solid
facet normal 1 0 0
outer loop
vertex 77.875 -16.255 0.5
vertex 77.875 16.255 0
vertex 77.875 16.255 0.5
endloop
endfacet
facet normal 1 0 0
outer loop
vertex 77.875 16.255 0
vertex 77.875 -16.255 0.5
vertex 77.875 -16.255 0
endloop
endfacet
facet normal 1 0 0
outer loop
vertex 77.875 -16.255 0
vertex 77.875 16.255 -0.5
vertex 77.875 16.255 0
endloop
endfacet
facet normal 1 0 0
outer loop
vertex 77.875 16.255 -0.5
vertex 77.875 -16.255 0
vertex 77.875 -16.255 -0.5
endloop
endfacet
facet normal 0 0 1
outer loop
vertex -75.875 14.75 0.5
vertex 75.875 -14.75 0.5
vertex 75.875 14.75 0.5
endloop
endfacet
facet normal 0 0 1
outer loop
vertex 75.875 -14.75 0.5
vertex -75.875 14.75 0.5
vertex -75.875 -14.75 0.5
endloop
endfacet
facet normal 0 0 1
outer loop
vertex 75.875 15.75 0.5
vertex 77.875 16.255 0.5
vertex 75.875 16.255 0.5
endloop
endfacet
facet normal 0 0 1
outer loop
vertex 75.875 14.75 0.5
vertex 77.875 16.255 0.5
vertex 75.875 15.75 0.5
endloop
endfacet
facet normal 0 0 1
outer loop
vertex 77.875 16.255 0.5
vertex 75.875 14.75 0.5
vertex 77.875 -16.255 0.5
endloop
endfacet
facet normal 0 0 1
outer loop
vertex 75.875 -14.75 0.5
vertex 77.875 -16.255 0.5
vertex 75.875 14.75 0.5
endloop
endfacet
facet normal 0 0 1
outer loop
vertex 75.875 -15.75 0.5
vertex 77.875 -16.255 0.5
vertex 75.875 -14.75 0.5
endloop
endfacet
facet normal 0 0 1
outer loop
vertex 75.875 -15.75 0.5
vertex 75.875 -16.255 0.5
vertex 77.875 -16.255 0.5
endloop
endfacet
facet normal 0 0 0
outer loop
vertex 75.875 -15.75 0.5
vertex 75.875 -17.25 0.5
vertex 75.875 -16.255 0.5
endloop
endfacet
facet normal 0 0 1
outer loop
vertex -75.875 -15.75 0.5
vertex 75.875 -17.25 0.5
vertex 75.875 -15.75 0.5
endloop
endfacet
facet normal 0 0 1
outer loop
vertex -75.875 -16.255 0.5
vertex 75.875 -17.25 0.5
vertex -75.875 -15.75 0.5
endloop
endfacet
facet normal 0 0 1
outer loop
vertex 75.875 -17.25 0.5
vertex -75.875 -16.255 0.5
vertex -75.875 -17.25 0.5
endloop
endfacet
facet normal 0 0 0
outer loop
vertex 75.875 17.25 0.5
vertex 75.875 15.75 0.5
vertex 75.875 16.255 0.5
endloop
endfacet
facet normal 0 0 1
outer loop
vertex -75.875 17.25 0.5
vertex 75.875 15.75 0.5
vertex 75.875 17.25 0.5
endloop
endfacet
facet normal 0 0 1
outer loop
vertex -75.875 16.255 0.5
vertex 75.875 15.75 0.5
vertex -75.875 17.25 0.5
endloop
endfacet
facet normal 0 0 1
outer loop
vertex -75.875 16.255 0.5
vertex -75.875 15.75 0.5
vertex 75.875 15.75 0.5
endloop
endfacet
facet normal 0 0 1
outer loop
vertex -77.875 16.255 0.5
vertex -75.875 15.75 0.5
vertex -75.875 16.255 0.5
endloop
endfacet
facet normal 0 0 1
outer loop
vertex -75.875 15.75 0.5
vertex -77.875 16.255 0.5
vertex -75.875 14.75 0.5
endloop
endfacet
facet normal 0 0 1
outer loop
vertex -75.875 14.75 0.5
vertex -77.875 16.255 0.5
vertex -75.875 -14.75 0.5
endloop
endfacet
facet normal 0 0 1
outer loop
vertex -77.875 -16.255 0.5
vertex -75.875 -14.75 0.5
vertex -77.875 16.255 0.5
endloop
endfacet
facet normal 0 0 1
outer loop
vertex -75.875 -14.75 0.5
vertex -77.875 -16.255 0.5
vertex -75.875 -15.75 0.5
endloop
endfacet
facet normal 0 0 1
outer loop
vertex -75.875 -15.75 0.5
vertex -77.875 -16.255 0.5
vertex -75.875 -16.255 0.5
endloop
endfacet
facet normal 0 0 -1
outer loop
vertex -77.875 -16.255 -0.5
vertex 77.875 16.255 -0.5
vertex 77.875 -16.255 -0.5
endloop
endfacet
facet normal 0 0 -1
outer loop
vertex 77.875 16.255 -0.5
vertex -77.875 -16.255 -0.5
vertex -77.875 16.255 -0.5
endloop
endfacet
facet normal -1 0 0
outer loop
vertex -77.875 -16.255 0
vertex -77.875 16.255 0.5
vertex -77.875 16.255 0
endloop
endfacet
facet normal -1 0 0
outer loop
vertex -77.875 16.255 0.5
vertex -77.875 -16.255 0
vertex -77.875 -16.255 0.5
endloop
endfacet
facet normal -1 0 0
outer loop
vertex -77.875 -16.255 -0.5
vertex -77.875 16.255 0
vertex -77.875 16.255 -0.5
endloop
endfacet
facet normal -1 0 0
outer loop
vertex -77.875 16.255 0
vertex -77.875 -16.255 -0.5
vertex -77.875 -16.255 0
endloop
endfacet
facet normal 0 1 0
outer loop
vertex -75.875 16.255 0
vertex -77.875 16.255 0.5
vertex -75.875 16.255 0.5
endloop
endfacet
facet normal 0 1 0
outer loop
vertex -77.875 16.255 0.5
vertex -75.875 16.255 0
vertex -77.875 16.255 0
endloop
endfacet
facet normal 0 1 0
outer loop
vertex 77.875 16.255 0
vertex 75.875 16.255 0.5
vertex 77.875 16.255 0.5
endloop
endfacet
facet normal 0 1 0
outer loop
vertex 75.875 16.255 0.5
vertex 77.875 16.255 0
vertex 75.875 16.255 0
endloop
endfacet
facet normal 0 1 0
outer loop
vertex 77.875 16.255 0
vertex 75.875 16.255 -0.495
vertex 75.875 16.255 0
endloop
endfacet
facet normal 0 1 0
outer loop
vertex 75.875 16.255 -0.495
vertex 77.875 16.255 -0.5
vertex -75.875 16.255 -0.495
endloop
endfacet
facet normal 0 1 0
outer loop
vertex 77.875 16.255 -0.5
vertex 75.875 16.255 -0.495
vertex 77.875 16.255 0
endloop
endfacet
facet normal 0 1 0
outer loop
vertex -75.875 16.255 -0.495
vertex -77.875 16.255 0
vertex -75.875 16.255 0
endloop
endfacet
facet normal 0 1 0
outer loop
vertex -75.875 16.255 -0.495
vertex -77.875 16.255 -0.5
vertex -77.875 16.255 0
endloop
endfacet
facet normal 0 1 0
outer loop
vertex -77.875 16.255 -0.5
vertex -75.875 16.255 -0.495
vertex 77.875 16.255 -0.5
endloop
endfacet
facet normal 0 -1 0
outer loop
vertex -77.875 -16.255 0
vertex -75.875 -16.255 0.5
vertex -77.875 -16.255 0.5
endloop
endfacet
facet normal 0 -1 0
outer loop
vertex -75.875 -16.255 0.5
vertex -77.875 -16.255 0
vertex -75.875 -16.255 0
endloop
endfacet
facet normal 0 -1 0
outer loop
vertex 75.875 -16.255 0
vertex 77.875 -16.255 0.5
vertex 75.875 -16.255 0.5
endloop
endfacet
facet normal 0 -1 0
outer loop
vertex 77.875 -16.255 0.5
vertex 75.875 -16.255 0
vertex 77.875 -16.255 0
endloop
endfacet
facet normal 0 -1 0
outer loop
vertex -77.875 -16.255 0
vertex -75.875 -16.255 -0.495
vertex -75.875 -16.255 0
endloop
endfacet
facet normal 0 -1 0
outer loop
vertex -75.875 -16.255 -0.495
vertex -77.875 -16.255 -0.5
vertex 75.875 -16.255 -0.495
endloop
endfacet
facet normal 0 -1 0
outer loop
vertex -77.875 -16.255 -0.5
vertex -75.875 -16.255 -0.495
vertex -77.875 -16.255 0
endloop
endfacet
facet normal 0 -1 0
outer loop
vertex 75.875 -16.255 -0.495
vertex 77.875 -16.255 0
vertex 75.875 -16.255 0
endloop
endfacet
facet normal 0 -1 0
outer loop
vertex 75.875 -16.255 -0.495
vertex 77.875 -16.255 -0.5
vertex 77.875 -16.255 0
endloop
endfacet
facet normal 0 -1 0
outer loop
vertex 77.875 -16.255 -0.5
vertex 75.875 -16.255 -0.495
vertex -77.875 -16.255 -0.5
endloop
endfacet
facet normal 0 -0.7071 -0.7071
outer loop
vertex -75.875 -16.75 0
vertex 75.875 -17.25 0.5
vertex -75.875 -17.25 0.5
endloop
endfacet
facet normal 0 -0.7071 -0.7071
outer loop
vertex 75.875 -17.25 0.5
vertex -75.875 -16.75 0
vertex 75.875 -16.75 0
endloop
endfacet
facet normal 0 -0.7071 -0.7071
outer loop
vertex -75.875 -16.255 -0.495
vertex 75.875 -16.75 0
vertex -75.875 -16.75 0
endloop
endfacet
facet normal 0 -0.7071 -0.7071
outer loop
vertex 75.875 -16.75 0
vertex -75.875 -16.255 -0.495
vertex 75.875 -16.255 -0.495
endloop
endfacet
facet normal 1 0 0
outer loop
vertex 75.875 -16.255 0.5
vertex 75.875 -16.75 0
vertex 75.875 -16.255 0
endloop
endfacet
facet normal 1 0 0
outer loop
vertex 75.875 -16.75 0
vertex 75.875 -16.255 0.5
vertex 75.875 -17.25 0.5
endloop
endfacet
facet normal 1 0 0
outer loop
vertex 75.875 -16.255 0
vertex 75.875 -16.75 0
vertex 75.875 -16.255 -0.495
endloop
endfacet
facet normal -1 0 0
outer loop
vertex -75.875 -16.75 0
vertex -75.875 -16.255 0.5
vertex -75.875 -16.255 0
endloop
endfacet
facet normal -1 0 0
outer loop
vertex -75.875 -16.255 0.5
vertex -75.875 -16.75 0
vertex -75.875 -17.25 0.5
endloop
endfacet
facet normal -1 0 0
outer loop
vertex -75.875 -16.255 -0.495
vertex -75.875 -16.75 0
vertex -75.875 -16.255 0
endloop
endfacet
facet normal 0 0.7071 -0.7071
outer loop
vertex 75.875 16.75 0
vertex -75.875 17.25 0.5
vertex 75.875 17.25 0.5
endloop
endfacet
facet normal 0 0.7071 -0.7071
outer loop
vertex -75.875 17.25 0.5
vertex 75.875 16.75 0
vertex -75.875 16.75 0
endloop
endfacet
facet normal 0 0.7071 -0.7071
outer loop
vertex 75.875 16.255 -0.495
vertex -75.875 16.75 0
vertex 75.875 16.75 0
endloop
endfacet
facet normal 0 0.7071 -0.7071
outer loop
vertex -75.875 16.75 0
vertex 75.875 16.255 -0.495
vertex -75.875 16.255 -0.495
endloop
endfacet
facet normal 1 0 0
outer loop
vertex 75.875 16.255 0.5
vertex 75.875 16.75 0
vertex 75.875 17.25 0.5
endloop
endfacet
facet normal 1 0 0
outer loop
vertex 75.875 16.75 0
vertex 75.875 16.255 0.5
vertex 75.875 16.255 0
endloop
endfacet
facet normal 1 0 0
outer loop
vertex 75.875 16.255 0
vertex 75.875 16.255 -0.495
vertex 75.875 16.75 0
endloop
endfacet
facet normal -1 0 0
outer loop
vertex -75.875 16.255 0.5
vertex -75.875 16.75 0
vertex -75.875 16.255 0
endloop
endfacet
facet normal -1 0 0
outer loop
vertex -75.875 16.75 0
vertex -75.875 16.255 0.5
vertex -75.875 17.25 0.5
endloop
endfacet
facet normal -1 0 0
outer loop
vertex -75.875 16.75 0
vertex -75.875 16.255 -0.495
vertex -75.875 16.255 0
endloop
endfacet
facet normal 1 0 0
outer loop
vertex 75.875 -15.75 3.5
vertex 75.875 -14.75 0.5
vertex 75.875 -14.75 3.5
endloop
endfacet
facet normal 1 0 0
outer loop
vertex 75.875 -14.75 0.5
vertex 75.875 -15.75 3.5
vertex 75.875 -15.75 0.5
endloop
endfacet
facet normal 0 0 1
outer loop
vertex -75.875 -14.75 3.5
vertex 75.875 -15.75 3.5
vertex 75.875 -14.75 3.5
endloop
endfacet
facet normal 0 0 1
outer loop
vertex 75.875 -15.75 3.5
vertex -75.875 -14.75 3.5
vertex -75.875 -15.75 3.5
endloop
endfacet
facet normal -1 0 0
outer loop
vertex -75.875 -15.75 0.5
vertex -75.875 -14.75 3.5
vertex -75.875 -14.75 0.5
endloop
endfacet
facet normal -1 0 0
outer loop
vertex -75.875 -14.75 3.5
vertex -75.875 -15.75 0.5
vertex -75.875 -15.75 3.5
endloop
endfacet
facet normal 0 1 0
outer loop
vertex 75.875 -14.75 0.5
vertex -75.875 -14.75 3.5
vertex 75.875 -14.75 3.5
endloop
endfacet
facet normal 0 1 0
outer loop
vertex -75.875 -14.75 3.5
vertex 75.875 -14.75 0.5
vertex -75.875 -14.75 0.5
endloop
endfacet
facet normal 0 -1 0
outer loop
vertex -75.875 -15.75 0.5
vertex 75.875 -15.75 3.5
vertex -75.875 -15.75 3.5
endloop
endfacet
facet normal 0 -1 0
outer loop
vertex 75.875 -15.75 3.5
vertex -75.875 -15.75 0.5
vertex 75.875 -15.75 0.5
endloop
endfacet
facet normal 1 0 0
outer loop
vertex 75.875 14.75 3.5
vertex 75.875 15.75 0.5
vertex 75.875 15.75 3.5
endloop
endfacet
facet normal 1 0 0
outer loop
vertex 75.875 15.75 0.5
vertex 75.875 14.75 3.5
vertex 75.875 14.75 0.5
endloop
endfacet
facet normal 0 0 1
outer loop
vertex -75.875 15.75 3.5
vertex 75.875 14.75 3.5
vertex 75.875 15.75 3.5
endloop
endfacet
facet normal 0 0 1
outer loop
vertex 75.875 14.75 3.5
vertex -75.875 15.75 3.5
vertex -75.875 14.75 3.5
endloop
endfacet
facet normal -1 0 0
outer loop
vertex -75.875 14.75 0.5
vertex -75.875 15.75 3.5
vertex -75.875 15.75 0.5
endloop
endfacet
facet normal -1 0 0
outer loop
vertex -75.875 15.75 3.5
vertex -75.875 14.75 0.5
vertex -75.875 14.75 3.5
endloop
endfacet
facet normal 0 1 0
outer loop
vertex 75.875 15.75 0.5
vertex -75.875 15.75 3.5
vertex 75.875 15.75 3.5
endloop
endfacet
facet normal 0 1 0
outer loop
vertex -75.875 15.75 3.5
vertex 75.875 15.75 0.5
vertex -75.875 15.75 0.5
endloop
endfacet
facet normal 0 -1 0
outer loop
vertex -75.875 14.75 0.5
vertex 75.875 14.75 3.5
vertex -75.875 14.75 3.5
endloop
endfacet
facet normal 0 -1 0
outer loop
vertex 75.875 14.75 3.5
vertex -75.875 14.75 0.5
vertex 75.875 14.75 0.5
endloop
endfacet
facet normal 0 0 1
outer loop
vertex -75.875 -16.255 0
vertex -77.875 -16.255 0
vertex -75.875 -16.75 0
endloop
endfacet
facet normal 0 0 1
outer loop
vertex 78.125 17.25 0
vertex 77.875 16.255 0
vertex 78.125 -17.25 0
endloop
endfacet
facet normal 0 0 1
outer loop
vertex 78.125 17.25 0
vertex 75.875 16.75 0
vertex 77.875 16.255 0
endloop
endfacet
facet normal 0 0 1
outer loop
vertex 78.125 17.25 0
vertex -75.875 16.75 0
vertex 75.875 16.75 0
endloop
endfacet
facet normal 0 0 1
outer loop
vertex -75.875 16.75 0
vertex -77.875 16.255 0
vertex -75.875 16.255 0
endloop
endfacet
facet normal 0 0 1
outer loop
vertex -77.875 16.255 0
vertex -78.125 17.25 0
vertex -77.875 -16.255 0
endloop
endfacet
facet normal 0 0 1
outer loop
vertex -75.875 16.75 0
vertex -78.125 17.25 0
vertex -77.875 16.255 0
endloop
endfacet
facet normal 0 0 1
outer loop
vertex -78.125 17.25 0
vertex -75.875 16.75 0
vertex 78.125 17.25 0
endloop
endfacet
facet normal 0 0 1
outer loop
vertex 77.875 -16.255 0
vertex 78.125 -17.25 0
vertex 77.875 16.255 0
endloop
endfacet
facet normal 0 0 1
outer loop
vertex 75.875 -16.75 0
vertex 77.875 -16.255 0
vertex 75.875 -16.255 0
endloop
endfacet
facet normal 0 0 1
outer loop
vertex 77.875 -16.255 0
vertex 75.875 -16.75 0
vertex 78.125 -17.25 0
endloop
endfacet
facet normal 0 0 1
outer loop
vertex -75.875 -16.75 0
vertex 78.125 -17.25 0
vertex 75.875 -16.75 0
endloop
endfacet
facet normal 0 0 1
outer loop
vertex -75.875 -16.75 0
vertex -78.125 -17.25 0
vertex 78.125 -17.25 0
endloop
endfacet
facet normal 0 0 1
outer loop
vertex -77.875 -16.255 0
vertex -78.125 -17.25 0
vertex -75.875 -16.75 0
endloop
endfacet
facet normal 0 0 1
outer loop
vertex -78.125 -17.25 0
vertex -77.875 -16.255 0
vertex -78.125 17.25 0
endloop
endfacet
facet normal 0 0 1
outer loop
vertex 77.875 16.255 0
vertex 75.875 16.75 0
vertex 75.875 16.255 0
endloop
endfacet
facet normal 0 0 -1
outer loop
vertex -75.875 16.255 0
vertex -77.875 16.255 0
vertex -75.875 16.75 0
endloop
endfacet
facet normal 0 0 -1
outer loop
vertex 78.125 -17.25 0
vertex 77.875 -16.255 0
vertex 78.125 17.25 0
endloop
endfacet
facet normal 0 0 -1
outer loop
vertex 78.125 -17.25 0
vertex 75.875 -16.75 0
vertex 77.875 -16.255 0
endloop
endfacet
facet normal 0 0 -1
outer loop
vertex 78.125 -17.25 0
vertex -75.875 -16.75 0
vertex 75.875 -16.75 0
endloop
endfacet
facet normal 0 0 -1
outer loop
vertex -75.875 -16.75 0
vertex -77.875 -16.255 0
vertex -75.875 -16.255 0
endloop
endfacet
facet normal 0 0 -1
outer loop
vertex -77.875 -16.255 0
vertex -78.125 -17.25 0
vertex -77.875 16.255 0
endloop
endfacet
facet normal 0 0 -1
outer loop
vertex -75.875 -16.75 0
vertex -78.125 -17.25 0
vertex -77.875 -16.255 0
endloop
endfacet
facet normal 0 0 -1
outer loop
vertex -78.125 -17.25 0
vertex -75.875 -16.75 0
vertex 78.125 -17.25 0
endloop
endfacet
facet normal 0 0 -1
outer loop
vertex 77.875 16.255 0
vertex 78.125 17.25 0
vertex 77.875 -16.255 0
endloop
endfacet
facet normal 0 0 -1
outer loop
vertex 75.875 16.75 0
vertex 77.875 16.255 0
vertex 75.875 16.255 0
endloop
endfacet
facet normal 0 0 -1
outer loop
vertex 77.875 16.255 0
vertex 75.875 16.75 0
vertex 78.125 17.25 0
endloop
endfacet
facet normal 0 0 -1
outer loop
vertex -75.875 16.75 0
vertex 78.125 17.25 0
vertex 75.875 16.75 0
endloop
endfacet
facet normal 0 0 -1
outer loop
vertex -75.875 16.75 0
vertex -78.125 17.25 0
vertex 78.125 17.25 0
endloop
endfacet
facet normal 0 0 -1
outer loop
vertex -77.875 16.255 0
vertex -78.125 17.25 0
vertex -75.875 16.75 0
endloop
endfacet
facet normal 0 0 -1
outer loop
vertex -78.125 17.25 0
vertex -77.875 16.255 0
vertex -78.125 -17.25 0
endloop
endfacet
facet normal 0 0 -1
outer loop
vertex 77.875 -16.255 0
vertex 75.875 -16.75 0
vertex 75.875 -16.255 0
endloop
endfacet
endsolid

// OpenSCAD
// file: mod_prism.scad
/// @file mod_prism.scad
///
/// @author © Dave Harris 2022
///

// points   1        ^
//        / | \      |
//       /  4  \     h
//      /  / \  \    |
//     0--/---\--2   v
//   w | /     \ | 
//     3---------5
//     <lLH><lRH>


module prism(h=20, lLH=15, lRH=25, w=1)
{
 polyhedron(
  points=[
   [0, 0, 0]       // 0 back LH corner
  ,[lLH, h, 0]     // 1 back peak
  ,[lLH+lRH, 0, 0] // 2 back RH corner
  ,[0, 0, w]       // 3 front LH corner
  ,[lLH, h, w]     // 4 front peak
  ,[lLH+lRH, 0, w] // 5 front RH corner
  ]
  , faces=[
    [0, 3, 5, 2] // bottom
   ,[0, 1, 4, 3] // LH ramp
   ,[1, 2, 5, 4] // RH ramp 
   ,[2, 1, 0]    // back wall
   ,[3, 4, 5]    // front wall
   ]
 );
} // end of module prism()

// local test prism
prism(lLH=1, lRH= 22, h=18, w=1 );

// eof
// file: fb_globals.scad
/// @file fb_globals.scad
///
/// @brief project footbridge globals
///
/// @author © Dave Harris 2022
///
/// Included in all project files.


$fa = 1;   // Fragment angle
$fs = 0.4; // Fragment size resolution

// global constants
//------------------

H_canopy = 47;

H_bridge = 49.5; // platform<>bridge
W_bridge = 36;   // width of bridge
                 // > walkway
W_walk   = 34.5; // width
H_walk   = 36;   // height of walkway


Steps    = 27;   // number of steps
W_stairs = 32;   // width ~ 9'6" @ H0
L_tread  = 3.5;  // tread ~ 12" @ H0
L_stairs = L_tread * (Steps +1);
H_rise   = H_bridge / (Steps +1); 
  // rise is 1.7678, not H0 1.75 (6")

W_lift   = 34;

W_build  = W_stairs +2;
L_build  = L_stairs+W_bridge+W_lift +2;

W_pillar = 4;

L_spacing = L_build /2;

Spans = 6;

L_canopy = ((Spans -1) * L_spacing) + W_pillar;

echo("len",L_canopy);

H_door   = 28;
W_door   = 18;

H_window = 6;
W_window = 16;


W_plat45  = 93.9;
W_track34 = 87.9;
W_plat23  = 93.8;
W_track12 = 87.9;

W_plat23edge =
   ( W_plat23 - W_stairs +2 ) /2 ;
W_plat45edge =
   ( W_plat45 - W_stairs +2 ) /2 ;
   
L_span34 = W_track34 + W_plat45edge + W_plat23edge;

L_span12 = 136.5;

W_grider = 2.2;

W_LEDstrip = 7.5;



// eof
// main file
/// @file fb_spanFloor.scad
///
/// @brief footbridge span floor
///
/// @author © Dave Harris 2022
///

include<fb_globals.scad>
use<mod_prism.scad>


module spanFloor(
                  length
                , width
                , W_girder
                )
{
    cube(  // floor
      [ length +4
      , width - W_girder +0.01
      , 1  ], center = true
    );

    translate(  // chamfer edge
      [ -(length /2)
      , 1 - (width /2)
      , -0.5  ]
    ) rotate(
        [ 90
        , -90
        , 90  ]
      ) prism(
            lLH = 1
          , lRH = 0
          , w = length
          , h = 1
        );

    translate(  // chamfer edge
      [ -(length /2)
      , width /2 
      , 0.5  ]
    ) rotate(
        [ 90
        , 180
        , 90  ]
      ) prism(
            lLH = 1
          , lRH = 0
          , w = length
          , h = 1
        );

    translate( // side support 1
      [ 0
      , W_girder - (width /2)
      , 1.5  ]
    ) cube(
        [ length
        , 1
        , 4  ], center = true
      );

    translate( // side support 2
      [ 0
      , (width /2) - W_girder
      , 1.5  ]
    ) cube(
        [ length
        , 1
        , 4  ], center = true
      );
}

echo("span34", L_span34, W_walk );

spanFloor( L_span34, W_walk, 2 );

color("blue") cube(
    [ L_span34 +4.5
    , W_walk
    , 0.0001 ], center=true);

// eof   
    
